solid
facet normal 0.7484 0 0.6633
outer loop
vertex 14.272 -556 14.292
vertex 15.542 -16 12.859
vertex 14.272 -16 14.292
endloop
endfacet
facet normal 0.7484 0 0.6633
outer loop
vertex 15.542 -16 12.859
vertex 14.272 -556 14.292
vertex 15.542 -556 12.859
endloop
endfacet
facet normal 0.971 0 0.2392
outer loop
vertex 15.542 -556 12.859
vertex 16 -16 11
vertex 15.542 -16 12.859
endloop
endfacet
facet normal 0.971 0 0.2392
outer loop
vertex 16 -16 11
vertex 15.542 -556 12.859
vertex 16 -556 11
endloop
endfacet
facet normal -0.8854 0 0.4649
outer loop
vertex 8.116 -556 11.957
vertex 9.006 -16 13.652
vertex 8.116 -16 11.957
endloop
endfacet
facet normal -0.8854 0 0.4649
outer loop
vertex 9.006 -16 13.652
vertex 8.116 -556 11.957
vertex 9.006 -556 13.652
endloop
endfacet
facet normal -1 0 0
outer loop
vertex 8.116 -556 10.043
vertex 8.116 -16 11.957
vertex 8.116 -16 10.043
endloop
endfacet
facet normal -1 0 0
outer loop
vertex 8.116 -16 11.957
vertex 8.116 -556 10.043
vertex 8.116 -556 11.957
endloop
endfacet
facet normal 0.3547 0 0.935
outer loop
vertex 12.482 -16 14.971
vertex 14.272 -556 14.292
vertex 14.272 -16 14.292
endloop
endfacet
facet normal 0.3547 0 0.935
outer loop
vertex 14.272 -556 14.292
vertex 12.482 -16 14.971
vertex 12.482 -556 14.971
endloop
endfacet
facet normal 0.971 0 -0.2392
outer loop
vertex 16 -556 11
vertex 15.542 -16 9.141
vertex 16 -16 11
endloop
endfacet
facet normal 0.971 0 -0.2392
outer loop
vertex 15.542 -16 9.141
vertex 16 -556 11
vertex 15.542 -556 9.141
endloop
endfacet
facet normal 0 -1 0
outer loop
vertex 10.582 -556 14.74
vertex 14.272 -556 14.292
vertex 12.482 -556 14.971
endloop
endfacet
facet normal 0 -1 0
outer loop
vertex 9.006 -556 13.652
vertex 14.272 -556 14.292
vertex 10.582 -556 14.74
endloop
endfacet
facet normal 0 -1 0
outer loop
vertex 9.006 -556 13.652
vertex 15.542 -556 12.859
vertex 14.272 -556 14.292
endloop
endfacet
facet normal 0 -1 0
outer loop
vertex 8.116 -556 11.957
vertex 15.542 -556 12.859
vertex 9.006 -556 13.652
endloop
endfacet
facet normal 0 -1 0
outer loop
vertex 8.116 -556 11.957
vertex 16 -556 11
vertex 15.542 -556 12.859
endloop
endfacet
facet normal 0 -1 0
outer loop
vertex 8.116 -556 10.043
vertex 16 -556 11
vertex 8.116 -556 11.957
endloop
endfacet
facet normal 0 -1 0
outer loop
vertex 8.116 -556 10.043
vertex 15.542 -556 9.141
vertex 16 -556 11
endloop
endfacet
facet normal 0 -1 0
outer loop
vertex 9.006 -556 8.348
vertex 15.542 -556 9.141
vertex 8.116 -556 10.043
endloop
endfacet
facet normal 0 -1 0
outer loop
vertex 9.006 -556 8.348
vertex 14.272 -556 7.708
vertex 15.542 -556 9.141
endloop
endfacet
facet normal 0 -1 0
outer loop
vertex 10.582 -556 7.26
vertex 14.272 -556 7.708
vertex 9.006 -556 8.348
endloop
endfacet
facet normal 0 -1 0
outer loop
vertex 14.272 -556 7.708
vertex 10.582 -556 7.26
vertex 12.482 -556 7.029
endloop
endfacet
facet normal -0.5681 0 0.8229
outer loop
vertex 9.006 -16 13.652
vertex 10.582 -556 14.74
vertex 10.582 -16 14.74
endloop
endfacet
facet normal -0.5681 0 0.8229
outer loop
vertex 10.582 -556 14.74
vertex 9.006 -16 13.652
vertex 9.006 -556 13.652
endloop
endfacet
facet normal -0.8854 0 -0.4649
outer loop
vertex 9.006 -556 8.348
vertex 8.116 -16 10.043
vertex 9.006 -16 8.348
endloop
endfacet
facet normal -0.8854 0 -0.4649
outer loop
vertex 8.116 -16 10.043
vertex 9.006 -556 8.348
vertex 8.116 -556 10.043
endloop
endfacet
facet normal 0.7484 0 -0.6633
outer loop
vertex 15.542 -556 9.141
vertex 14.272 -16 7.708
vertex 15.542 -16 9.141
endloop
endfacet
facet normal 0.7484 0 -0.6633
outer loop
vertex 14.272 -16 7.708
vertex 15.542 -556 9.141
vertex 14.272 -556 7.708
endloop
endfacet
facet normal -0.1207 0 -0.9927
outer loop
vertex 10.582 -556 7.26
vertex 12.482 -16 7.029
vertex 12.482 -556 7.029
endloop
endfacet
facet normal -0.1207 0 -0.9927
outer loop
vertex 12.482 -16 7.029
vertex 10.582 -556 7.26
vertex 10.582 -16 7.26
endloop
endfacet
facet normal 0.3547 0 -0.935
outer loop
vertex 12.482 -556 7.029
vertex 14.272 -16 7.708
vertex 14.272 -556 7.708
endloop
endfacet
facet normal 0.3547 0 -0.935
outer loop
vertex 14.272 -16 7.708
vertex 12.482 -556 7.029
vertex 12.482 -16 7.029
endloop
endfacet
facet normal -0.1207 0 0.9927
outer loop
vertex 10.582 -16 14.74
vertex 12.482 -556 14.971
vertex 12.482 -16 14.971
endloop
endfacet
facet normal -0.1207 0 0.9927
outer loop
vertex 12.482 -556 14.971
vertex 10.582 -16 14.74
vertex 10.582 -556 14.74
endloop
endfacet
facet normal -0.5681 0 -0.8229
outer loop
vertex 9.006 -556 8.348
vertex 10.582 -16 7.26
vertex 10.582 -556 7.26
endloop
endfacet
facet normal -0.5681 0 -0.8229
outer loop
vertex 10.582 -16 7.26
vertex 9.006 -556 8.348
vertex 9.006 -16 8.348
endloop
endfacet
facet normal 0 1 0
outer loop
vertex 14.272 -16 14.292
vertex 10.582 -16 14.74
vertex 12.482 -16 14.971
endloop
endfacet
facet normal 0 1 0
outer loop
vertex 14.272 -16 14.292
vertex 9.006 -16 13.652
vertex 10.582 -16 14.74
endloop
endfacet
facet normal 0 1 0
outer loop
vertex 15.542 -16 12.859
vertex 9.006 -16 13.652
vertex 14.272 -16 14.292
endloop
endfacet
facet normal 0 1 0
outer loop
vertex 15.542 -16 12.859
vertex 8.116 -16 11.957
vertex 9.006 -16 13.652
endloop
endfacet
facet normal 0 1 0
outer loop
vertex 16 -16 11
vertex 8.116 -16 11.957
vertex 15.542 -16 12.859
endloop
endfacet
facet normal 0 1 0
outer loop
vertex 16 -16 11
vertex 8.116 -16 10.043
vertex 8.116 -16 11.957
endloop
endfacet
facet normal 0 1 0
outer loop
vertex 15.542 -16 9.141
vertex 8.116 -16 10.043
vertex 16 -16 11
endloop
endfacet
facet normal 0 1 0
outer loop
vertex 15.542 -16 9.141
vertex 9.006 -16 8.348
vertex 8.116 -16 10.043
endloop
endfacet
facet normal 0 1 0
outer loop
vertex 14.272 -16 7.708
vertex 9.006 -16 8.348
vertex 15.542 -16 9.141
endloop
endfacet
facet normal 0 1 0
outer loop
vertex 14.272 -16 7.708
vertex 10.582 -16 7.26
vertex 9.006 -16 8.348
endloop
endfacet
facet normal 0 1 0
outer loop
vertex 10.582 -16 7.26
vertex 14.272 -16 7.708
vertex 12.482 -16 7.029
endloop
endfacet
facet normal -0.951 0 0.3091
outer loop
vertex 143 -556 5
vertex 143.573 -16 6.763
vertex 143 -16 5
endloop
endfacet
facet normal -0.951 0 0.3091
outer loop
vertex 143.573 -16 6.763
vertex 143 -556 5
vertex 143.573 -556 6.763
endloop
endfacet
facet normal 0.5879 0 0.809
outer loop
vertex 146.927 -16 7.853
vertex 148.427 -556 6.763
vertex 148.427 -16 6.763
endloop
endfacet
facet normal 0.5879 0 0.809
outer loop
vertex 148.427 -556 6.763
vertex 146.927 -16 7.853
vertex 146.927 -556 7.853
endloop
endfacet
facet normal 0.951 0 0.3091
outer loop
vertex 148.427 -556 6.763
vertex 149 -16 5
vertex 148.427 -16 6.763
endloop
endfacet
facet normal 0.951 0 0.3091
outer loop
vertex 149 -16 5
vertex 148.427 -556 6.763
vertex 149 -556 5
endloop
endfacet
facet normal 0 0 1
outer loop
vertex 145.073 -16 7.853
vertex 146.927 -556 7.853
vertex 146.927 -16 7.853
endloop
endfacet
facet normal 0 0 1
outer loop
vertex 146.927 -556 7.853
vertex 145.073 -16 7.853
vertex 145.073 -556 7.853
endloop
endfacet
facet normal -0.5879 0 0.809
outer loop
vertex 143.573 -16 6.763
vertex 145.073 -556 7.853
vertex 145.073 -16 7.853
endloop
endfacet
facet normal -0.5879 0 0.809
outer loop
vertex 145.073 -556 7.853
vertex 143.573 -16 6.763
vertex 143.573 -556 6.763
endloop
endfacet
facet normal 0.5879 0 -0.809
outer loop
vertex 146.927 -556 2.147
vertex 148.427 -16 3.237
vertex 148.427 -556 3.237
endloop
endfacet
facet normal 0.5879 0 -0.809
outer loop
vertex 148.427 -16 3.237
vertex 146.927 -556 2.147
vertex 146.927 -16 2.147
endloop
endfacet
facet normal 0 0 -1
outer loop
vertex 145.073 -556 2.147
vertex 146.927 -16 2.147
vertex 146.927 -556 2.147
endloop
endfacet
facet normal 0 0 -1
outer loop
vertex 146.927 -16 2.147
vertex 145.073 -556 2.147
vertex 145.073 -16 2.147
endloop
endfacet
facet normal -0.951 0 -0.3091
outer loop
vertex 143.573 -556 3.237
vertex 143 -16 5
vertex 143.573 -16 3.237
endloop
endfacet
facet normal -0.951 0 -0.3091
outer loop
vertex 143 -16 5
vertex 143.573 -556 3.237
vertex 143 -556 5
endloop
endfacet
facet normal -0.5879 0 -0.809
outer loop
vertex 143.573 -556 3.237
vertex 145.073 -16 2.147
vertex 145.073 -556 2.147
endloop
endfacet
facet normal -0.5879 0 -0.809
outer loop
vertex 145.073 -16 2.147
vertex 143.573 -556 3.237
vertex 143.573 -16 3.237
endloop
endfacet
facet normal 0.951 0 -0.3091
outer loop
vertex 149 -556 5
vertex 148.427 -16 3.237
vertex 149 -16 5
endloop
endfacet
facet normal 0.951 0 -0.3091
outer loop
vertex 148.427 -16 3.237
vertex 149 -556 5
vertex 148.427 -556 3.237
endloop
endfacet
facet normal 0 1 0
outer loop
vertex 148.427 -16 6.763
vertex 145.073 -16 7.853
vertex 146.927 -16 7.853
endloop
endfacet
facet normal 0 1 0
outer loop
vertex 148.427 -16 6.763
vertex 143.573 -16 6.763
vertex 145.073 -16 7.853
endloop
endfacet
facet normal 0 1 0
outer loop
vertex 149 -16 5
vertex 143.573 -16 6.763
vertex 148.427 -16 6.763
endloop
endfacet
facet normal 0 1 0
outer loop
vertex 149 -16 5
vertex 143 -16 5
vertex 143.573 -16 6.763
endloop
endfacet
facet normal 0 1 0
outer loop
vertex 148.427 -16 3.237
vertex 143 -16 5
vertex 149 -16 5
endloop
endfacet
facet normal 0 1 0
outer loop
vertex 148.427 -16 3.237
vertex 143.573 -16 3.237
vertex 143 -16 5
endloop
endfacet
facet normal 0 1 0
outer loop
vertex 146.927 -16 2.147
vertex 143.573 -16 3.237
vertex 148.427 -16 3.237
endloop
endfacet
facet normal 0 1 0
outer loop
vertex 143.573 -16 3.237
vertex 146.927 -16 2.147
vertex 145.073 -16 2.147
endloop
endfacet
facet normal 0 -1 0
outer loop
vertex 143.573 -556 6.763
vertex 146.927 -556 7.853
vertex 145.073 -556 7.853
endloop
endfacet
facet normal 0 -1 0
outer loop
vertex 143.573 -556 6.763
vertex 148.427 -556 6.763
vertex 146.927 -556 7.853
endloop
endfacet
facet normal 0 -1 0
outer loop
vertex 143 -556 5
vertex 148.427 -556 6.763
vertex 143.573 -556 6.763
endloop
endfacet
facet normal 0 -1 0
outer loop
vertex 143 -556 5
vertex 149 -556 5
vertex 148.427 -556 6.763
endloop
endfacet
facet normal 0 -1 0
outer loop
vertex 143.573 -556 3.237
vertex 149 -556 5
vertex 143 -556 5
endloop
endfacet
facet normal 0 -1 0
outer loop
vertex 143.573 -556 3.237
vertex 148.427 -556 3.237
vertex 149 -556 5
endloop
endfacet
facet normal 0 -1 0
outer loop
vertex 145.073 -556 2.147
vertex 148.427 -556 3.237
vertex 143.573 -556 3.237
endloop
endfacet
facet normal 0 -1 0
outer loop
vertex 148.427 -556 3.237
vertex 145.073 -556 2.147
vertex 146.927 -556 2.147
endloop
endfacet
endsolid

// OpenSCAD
// file: rib.scad
module solid_rib(){
scale(0.42)
linear_extrude(file = "../rib/NACA_4415_circles_lighter.dxf",
height = 10, convexity = 10
);
}


module rib(rod_leading,rod_trailing){
difference(){
solid_rib();
translate([12,11,-1])
cylinder(r=rod_leading/2,h=100);

translate([146,5,-1])
cylinder(r=rod_trailing/2,h=100);

}
}

rib(8,6);
// main file
 
use<rib.scad>;

module vrib(){
rotate([90,0,0])
rib(8,6);
}

module rods_left_wing(){

translate([0,-52,0]){
// Rods
translate([0,50,0])
rotate([90,0,0])
translate([12,11,14])
cylinder(r=8/2,h=540);

translate([0,50,0])
rotate([90,0,0])
translate([146,5,14])
cylinder(r=6/2,h=540);

}
}

module left_wing(){

rods_left_wing();

translate([0,-52,0]){


// Ribs
for(i=[0:6])
translate([0,-i*((550-50)/6),0])vrib();
}

}

left_wing();
